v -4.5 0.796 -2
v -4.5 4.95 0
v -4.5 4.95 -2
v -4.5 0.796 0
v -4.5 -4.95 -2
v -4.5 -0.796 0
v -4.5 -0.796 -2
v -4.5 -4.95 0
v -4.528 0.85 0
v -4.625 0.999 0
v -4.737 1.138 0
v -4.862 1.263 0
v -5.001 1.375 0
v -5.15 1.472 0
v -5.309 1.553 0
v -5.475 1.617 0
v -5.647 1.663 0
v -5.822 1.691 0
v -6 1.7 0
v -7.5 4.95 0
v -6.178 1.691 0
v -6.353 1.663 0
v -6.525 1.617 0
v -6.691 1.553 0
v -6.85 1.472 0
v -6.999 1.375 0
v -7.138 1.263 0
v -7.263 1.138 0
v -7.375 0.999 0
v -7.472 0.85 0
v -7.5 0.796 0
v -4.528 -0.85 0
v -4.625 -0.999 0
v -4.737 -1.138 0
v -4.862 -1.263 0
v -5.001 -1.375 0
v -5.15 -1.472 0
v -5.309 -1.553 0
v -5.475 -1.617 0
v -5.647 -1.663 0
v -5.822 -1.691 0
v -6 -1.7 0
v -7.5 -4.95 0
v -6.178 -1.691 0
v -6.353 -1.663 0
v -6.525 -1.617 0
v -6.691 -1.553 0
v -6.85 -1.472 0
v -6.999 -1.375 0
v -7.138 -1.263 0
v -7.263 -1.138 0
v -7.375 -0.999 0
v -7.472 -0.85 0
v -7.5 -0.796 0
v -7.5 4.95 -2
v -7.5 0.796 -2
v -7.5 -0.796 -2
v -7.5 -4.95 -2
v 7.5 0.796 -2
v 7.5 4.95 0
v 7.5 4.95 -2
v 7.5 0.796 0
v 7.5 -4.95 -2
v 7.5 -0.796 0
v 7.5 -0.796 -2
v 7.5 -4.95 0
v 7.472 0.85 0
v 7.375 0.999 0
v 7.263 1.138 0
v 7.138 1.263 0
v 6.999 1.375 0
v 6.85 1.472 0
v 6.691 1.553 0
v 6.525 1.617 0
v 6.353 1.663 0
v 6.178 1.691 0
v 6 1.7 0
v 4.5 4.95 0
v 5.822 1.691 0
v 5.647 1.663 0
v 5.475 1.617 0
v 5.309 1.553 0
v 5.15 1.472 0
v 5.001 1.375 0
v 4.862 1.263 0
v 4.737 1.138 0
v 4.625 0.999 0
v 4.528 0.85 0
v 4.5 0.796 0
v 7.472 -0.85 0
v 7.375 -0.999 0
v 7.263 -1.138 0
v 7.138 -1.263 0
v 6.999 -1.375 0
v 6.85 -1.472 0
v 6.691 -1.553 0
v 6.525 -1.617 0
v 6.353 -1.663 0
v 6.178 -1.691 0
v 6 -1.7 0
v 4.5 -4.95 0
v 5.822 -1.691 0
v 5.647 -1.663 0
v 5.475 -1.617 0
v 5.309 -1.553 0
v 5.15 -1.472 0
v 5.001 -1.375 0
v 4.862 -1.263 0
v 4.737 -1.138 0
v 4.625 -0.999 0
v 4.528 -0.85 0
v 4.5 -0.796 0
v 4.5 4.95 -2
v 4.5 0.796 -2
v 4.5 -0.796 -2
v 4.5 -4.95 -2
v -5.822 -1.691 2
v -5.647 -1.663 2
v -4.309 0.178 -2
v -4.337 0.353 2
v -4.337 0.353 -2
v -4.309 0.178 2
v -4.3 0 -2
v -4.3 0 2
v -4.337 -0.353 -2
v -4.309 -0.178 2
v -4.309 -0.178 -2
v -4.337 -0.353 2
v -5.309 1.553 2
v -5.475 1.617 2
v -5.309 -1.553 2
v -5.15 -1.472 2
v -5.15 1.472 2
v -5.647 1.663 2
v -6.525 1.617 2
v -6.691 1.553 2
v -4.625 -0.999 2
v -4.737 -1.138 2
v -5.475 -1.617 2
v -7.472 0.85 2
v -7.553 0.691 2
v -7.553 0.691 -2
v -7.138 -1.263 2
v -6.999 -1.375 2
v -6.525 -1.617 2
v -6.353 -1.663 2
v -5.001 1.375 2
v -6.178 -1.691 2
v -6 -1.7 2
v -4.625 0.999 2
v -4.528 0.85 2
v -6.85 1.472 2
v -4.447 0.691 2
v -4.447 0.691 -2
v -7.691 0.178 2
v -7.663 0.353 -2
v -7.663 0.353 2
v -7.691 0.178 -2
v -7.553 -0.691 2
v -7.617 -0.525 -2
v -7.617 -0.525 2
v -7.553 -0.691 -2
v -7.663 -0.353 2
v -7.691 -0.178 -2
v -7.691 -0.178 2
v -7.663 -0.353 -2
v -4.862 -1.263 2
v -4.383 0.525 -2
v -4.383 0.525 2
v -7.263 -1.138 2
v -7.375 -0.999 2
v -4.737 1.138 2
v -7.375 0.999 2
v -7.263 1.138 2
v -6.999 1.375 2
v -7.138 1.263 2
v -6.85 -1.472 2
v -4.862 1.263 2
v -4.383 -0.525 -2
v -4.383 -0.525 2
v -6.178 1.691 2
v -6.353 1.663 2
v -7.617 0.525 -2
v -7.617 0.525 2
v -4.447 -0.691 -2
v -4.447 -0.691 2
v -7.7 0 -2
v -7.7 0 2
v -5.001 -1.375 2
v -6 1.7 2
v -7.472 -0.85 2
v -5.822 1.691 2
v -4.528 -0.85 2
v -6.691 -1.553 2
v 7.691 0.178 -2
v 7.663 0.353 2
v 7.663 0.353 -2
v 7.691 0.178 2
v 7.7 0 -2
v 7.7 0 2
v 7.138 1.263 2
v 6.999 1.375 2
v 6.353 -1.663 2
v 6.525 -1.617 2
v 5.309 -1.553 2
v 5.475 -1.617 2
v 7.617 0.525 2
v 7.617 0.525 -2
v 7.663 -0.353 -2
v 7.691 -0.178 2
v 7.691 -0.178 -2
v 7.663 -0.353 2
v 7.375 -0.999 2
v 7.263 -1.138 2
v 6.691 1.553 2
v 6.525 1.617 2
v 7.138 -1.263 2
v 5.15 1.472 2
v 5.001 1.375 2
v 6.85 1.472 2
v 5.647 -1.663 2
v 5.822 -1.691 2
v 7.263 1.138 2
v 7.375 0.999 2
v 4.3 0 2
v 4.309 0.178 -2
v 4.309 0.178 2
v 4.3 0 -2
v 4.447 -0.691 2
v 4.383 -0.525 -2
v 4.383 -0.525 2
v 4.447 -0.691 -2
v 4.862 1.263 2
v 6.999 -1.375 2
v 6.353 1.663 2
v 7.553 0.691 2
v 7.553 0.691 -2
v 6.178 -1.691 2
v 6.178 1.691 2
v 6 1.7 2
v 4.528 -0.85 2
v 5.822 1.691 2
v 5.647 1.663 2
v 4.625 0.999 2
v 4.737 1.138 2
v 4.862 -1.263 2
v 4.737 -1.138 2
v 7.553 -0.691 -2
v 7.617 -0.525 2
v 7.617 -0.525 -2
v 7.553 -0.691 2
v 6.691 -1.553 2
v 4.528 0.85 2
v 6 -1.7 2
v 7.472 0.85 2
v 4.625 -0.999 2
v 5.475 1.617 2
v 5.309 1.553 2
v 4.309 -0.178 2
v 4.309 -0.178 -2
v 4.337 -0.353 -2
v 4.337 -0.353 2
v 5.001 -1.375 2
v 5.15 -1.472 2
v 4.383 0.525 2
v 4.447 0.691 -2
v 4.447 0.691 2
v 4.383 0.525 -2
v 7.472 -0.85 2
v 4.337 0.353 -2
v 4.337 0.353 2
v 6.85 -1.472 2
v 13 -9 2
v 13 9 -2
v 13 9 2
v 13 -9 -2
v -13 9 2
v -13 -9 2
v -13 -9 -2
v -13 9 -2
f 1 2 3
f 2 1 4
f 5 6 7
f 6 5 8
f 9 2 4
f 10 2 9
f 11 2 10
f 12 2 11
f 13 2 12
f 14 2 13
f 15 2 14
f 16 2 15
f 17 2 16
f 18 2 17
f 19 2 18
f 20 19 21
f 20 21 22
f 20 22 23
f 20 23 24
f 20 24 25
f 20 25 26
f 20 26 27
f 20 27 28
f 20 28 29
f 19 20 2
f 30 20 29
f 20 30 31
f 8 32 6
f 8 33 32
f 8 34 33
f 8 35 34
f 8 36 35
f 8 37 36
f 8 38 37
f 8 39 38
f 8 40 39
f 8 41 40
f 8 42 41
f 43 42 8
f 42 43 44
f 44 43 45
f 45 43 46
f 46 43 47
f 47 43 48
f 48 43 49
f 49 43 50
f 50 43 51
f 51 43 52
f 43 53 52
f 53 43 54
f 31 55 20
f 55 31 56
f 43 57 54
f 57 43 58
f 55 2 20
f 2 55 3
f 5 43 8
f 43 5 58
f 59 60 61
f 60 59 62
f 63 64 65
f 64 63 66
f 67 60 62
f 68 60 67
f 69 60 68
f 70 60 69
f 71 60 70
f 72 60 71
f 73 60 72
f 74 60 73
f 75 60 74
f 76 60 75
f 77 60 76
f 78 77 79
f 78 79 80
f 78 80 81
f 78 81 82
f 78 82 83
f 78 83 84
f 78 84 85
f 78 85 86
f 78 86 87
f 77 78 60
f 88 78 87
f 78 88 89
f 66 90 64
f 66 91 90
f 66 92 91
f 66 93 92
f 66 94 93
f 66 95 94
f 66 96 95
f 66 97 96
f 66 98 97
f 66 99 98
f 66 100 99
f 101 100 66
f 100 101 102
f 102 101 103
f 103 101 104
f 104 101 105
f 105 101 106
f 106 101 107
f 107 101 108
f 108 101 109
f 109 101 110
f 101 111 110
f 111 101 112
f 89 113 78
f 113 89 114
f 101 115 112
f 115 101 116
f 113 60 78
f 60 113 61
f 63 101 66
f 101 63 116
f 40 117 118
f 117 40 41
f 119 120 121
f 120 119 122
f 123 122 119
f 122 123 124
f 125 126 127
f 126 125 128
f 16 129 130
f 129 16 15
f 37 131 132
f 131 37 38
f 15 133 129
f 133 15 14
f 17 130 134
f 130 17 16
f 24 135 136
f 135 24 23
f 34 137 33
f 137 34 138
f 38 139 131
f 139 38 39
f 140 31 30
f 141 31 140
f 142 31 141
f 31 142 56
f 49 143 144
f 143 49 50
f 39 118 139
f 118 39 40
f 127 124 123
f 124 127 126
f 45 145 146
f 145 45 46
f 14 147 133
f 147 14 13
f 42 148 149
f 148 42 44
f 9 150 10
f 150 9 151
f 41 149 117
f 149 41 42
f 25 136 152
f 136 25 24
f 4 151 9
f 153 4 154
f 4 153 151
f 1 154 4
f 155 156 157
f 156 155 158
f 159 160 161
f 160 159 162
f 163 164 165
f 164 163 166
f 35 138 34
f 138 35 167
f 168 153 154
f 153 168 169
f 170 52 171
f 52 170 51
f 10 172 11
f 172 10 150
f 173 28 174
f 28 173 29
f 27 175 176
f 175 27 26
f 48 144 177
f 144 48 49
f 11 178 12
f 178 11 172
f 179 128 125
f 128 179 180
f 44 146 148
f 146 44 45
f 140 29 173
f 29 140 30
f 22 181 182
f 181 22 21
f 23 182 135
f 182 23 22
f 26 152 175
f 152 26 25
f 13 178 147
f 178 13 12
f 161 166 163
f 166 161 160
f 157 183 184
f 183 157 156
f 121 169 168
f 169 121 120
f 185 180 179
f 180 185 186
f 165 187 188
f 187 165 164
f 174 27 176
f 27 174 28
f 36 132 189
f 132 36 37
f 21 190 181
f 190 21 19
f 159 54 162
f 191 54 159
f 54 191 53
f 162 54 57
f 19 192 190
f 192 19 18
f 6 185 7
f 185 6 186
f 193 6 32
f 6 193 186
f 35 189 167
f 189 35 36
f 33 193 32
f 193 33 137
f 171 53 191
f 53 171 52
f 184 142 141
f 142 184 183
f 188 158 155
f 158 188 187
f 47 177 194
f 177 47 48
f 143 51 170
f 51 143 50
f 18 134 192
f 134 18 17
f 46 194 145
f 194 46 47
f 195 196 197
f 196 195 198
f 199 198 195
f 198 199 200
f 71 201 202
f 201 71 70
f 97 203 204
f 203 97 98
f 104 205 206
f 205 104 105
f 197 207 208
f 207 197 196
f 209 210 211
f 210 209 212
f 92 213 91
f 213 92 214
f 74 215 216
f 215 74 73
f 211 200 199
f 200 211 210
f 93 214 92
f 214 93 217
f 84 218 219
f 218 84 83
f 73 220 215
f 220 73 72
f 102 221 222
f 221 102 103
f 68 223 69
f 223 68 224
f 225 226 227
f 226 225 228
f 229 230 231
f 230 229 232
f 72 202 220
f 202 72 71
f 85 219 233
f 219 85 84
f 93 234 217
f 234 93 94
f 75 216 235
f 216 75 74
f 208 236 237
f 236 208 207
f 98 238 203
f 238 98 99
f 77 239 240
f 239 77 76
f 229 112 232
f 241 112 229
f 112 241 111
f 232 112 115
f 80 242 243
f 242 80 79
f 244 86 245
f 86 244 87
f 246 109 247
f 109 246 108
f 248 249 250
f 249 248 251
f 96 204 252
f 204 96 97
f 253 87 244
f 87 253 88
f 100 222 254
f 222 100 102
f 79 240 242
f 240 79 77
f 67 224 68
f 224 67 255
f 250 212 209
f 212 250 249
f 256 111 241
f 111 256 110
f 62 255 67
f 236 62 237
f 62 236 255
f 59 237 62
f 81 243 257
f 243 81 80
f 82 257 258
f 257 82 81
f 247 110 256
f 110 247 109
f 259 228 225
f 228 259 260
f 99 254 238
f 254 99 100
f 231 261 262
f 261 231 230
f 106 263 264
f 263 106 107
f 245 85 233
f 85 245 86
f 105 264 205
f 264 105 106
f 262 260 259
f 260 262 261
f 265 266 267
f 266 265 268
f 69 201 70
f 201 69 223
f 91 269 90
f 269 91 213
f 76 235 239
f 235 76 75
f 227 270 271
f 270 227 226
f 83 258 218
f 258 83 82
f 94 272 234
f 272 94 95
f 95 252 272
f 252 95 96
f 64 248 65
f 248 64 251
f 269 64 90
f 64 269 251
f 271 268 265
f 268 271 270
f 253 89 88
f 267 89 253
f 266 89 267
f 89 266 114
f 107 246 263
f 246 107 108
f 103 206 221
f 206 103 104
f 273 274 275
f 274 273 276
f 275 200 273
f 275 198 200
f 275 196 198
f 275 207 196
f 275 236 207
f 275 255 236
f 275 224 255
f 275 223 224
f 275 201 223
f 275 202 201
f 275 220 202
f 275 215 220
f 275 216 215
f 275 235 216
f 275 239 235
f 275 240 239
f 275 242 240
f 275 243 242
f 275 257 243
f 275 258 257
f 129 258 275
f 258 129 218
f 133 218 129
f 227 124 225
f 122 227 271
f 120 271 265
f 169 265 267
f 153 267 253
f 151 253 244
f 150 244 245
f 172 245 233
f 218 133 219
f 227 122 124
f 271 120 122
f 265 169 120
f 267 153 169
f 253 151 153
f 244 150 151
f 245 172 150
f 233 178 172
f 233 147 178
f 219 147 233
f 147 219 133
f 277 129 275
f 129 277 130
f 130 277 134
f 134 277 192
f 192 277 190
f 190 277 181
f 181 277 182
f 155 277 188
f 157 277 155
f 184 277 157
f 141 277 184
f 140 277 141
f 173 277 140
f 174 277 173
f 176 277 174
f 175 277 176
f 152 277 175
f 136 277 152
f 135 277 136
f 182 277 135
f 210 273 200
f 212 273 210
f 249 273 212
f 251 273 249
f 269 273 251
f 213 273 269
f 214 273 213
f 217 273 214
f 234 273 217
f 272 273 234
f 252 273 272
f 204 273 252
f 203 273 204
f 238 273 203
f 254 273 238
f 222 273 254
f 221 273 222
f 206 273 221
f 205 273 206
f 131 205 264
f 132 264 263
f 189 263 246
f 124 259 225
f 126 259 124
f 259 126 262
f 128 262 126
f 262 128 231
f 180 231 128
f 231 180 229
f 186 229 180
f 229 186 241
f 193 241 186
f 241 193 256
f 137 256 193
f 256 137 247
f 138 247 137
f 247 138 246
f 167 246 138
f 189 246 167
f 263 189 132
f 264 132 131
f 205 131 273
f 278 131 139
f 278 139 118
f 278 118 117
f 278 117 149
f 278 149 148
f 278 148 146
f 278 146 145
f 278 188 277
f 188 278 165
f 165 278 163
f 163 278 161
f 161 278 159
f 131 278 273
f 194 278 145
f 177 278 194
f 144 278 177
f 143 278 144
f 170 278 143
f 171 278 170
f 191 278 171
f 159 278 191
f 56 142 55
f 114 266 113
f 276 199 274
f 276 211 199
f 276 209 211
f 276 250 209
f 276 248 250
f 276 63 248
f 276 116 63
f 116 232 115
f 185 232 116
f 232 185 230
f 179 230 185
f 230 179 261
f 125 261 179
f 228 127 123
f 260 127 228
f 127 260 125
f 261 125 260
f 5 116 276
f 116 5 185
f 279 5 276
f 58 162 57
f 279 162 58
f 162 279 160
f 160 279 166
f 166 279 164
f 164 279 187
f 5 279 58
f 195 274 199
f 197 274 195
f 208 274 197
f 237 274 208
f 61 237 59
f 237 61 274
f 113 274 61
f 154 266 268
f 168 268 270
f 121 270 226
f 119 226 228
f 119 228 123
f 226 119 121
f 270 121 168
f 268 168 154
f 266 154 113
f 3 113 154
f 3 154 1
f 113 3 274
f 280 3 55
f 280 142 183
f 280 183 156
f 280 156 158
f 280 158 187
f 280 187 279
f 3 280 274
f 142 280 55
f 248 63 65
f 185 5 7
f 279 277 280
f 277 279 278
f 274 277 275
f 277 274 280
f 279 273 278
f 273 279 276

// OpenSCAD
// Cable-tie base with two strap slots.
$fn = 60;
eps = 0.02;
base_w = 18;
base_l = 26;
base_t = 4;
slot_w = 3;
slot_l = 12;
difference() {
    cube([base_l,base_w,base_t],center=true);
    for (x=[-slot_l/2,slot_l/2]) translate([x,0,-base_t/2-eps]) cube([slot_w,base_w*0.55,base_t+2*eps],center=true);
    for (x=[-base_l/2+7,base_l/2-7]) translate([x,0,-base_t/2-eps]) cylinder(d=3.4,h=base_t+2*eps);
}
